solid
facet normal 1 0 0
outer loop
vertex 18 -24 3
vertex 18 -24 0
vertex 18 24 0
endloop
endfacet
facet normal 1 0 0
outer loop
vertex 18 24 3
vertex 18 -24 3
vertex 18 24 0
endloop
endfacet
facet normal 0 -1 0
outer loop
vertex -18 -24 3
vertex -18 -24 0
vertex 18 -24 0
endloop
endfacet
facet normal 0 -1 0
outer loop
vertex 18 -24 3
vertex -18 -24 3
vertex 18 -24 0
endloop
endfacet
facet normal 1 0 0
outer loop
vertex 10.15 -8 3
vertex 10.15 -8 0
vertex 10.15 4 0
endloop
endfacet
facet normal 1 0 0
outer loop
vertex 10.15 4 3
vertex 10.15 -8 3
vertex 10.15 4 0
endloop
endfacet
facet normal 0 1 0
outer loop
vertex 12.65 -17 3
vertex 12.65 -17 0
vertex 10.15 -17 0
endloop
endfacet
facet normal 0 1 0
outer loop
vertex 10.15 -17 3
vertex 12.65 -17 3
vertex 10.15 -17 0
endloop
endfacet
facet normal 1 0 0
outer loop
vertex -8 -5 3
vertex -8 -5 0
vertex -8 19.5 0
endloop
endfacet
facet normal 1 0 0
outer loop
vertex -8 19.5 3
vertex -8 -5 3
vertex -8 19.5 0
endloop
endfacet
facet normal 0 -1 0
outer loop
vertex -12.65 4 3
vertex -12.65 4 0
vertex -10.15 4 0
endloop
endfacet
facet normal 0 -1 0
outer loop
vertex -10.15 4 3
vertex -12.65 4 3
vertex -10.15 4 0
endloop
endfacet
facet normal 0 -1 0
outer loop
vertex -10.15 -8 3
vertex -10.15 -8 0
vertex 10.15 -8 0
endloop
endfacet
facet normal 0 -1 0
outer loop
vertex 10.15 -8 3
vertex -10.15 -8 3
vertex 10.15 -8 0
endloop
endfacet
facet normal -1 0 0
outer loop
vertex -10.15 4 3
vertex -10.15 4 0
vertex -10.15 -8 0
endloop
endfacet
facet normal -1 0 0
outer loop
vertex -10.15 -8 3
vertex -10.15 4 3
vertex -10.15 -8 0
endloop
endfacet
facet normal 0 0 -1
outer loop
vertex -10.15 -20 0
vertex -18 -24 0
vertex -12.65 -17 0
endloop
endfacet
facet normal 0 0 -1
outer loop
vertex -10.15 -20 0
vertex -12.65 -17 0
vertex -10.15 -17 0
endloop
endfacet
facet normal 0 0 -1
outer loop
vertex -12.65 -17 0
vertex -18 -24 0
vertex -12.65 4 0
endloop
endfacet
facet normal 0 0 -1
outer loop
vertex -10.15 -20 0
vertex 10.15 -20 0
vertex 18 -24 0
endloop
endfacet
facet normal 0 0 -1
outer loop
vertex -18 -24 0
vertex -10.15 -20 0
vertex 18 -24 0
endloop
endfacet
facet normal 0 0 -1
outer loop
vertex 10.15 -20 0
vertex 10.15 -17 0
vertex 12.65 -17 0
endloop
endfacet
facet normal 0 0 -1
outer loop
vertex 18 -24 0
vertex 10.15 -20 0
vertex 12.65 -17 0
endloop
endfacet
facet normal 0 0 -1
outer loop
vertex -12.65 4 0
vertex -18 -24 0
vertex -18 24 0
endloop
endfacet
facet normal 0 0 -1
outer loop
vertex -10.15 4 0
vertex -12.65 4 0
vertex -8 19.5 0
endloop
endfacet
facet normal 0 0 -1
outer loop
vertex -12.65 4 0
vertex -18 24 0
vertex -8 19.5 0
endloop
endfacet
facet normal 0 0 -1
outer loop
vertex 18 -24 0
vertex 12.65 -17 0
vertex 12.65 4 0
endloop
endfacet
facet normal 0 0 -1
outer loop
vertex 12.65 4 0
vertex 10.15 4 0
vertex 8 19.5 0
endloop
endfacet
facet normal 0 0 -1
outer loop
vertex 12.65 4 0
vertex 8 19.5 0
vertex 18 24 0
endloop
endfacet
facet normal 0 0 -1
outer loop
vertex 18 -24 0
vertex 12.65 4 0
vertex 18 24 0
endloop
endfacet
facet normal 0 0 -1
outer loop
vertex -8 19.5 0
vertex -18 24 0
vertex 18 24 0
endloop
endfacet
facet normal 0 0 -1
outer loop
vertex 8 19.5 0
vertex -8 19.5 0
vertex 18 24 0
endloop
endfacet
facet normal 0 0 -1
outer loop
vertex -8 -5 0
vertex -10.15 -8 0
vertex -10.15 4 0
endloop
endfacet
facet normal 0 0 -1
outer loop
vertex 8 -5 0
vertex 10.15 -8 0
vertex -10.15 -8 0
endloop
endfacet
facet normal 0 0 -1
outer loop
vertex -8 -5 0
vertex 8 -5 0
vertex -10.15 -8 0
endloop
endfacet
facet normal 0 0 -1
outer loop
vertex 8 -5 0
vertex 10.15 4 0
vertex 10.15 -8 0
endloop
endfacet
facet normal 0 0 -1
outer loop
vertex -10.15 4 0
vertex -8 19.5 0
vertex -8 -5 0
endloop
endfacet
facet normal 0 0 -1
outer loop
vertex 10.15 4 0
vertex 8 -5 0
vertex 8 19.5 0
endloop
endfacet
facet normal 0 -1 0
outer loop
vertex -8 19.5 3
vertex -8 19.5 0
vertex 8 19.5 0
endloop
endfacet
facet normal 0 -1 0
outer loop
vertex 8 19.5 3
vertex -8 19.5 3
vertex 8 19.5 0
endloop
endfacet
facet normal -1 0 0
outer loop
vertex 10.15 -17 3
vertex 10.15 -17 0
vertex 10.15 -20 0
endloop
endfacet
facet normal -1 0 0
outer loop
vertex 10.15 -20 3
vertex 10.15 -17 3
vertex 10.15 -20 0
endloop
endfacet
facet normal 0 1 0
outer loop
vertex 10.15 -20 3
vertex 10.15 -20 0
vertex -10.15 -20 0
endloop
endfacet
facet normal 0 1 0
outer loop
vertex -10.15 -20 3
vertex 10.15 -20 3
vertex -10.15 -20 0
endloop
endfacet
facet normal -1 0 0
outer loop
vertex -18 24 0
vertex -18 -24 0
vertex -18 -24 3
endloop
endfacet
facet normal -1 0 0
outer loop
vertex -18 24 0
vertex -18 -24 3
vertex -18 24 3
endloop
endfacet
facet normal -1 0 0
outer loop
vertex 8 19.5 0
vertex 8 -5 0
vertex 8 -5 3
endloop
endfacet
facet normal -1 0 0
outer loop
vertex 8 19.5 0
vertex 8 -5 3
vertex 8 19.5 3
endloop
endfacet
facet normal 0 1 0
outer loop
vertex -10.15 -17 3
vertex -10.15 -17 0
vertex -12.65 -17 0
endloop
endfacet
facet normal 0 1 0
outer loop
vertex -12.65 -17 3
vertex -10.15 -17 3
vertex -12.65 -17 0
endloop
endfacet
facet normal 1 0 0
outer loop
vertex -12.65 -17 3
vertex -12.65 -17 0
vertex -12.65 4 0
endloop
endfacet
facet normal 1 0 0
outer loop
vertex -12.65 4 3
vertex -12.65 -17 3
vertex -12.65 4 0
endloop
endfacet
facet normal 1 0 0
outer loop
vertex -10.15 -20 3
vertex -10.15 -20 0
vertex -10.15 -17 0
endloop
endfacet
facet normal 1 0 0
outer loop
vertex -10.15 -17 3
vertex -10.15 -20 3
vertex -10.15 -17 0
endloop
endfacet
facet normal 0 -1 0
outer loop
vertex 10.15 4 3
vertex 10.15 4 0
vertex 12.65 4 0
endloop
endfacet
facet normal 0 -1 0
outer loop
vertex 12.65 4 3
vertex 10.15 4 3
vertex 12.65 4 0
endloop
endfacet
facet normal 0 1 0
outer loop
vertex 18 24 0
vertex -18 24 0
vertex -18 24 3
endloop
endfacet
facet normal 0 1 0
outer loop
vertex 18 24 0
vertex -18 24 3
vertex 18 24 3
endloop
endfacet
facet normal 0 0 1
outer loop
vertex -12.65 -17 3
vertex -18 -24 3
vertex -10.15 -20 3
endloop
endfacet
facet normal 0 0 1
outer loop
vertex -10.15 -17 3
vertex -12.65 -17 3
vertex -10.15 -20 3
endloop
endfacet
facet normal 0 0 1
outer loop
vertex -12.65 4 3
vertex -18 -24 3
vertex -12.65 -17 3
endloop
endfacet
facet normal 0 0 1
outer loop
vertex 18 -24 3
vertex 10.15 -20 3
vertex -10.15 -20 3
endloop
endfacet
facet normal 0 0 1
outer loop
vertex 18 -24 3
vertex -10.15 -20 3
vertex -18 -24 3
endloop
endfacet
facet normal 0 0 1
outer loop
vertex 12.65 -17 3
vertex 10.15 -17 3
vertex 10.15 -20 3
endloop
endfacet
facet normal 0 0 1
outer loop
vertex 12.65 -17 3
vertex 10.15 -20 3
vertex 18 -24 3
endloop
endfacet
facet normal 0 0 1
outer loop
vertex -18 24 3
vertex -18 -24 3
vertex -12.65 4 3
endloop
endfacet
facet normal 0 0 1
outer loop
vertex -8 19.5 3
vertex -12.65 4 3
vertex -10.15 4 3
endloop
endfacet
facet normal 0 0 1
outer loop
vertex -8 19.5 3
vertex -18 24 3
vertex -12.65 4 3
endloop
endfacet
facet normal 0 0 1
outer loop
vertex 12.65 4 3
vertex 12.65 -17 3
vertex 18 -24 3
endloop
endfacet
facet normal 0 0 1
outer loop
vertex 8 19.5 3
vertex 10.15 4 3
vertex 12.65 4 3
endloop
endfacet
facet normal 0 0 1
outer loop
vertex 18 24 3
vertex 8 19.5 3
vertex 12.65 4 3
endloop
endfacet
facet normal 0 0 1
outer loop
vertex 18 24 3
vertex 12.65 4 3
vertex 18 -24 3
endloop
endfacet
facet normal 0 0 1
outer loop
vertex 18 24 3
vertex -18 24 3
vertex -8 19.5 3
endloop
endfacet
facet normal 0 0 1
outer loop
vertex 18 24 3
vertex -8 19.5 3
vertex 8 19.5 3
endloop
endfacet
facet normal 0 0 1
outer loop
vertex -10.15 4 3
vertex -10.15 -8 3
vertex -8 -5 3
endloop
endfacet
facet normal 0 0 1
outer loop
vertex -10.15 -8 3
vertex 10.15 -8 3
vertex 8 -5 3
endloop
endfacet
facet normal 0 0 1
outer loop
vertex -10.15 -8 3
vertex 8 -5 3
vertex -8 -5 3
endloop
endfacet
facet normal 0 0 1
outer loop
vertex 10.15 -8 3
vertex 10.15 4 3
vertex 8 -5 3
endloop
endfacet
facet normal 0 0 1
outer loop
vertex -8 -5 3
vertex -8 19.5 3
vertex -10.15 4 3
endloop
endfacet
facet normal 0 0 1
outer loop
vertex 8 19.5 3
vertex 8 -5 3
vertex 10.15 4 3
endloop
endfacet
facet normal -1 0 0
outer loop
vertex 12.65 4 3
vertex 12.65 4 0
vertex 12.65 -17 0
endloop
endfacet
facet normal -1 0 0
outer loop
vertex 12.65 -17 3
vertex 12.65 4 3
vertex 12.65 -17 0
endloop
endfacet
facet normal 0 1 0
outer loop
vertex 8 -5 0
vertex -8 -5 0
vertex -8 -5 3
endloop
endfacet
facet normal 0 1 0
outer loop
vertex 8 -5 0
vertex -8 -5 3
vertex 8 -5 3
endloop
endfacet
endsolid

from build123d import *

# Parameters (mm, degrees)
SKETCH_W   = 36
SKETCH_H   = 48
SKETCH_W_2 = 16
SKETCH_H_2 = 24.5
PAD_DEPTH  = 3


with BuildPart() as part:
    # Sketch → Pad (new body)
    with BuildSketch(Plane.XY):
        Rectangle(SKETCH_W, SKETCH_H)
        Polygon((-12.65, 4), (-10.15, 4), (-10.15, -8), (10.15, -8), (10.15, 4), (12.65, 4), (12.65, -17), (10.15, -17), (10.15, -20), (-10.15, -20), (-10.15, -17), (-12.65, -17), align=None, mode=Mode.SUBTRACT)
        with Locations((0, 7.25)):
            Rectangle(SKETCH_W_2, SKETCH_H_2, mode=Mode.SUBTRACT)
    extrude(amount=PAD_DEPTH)


solid = part.part
